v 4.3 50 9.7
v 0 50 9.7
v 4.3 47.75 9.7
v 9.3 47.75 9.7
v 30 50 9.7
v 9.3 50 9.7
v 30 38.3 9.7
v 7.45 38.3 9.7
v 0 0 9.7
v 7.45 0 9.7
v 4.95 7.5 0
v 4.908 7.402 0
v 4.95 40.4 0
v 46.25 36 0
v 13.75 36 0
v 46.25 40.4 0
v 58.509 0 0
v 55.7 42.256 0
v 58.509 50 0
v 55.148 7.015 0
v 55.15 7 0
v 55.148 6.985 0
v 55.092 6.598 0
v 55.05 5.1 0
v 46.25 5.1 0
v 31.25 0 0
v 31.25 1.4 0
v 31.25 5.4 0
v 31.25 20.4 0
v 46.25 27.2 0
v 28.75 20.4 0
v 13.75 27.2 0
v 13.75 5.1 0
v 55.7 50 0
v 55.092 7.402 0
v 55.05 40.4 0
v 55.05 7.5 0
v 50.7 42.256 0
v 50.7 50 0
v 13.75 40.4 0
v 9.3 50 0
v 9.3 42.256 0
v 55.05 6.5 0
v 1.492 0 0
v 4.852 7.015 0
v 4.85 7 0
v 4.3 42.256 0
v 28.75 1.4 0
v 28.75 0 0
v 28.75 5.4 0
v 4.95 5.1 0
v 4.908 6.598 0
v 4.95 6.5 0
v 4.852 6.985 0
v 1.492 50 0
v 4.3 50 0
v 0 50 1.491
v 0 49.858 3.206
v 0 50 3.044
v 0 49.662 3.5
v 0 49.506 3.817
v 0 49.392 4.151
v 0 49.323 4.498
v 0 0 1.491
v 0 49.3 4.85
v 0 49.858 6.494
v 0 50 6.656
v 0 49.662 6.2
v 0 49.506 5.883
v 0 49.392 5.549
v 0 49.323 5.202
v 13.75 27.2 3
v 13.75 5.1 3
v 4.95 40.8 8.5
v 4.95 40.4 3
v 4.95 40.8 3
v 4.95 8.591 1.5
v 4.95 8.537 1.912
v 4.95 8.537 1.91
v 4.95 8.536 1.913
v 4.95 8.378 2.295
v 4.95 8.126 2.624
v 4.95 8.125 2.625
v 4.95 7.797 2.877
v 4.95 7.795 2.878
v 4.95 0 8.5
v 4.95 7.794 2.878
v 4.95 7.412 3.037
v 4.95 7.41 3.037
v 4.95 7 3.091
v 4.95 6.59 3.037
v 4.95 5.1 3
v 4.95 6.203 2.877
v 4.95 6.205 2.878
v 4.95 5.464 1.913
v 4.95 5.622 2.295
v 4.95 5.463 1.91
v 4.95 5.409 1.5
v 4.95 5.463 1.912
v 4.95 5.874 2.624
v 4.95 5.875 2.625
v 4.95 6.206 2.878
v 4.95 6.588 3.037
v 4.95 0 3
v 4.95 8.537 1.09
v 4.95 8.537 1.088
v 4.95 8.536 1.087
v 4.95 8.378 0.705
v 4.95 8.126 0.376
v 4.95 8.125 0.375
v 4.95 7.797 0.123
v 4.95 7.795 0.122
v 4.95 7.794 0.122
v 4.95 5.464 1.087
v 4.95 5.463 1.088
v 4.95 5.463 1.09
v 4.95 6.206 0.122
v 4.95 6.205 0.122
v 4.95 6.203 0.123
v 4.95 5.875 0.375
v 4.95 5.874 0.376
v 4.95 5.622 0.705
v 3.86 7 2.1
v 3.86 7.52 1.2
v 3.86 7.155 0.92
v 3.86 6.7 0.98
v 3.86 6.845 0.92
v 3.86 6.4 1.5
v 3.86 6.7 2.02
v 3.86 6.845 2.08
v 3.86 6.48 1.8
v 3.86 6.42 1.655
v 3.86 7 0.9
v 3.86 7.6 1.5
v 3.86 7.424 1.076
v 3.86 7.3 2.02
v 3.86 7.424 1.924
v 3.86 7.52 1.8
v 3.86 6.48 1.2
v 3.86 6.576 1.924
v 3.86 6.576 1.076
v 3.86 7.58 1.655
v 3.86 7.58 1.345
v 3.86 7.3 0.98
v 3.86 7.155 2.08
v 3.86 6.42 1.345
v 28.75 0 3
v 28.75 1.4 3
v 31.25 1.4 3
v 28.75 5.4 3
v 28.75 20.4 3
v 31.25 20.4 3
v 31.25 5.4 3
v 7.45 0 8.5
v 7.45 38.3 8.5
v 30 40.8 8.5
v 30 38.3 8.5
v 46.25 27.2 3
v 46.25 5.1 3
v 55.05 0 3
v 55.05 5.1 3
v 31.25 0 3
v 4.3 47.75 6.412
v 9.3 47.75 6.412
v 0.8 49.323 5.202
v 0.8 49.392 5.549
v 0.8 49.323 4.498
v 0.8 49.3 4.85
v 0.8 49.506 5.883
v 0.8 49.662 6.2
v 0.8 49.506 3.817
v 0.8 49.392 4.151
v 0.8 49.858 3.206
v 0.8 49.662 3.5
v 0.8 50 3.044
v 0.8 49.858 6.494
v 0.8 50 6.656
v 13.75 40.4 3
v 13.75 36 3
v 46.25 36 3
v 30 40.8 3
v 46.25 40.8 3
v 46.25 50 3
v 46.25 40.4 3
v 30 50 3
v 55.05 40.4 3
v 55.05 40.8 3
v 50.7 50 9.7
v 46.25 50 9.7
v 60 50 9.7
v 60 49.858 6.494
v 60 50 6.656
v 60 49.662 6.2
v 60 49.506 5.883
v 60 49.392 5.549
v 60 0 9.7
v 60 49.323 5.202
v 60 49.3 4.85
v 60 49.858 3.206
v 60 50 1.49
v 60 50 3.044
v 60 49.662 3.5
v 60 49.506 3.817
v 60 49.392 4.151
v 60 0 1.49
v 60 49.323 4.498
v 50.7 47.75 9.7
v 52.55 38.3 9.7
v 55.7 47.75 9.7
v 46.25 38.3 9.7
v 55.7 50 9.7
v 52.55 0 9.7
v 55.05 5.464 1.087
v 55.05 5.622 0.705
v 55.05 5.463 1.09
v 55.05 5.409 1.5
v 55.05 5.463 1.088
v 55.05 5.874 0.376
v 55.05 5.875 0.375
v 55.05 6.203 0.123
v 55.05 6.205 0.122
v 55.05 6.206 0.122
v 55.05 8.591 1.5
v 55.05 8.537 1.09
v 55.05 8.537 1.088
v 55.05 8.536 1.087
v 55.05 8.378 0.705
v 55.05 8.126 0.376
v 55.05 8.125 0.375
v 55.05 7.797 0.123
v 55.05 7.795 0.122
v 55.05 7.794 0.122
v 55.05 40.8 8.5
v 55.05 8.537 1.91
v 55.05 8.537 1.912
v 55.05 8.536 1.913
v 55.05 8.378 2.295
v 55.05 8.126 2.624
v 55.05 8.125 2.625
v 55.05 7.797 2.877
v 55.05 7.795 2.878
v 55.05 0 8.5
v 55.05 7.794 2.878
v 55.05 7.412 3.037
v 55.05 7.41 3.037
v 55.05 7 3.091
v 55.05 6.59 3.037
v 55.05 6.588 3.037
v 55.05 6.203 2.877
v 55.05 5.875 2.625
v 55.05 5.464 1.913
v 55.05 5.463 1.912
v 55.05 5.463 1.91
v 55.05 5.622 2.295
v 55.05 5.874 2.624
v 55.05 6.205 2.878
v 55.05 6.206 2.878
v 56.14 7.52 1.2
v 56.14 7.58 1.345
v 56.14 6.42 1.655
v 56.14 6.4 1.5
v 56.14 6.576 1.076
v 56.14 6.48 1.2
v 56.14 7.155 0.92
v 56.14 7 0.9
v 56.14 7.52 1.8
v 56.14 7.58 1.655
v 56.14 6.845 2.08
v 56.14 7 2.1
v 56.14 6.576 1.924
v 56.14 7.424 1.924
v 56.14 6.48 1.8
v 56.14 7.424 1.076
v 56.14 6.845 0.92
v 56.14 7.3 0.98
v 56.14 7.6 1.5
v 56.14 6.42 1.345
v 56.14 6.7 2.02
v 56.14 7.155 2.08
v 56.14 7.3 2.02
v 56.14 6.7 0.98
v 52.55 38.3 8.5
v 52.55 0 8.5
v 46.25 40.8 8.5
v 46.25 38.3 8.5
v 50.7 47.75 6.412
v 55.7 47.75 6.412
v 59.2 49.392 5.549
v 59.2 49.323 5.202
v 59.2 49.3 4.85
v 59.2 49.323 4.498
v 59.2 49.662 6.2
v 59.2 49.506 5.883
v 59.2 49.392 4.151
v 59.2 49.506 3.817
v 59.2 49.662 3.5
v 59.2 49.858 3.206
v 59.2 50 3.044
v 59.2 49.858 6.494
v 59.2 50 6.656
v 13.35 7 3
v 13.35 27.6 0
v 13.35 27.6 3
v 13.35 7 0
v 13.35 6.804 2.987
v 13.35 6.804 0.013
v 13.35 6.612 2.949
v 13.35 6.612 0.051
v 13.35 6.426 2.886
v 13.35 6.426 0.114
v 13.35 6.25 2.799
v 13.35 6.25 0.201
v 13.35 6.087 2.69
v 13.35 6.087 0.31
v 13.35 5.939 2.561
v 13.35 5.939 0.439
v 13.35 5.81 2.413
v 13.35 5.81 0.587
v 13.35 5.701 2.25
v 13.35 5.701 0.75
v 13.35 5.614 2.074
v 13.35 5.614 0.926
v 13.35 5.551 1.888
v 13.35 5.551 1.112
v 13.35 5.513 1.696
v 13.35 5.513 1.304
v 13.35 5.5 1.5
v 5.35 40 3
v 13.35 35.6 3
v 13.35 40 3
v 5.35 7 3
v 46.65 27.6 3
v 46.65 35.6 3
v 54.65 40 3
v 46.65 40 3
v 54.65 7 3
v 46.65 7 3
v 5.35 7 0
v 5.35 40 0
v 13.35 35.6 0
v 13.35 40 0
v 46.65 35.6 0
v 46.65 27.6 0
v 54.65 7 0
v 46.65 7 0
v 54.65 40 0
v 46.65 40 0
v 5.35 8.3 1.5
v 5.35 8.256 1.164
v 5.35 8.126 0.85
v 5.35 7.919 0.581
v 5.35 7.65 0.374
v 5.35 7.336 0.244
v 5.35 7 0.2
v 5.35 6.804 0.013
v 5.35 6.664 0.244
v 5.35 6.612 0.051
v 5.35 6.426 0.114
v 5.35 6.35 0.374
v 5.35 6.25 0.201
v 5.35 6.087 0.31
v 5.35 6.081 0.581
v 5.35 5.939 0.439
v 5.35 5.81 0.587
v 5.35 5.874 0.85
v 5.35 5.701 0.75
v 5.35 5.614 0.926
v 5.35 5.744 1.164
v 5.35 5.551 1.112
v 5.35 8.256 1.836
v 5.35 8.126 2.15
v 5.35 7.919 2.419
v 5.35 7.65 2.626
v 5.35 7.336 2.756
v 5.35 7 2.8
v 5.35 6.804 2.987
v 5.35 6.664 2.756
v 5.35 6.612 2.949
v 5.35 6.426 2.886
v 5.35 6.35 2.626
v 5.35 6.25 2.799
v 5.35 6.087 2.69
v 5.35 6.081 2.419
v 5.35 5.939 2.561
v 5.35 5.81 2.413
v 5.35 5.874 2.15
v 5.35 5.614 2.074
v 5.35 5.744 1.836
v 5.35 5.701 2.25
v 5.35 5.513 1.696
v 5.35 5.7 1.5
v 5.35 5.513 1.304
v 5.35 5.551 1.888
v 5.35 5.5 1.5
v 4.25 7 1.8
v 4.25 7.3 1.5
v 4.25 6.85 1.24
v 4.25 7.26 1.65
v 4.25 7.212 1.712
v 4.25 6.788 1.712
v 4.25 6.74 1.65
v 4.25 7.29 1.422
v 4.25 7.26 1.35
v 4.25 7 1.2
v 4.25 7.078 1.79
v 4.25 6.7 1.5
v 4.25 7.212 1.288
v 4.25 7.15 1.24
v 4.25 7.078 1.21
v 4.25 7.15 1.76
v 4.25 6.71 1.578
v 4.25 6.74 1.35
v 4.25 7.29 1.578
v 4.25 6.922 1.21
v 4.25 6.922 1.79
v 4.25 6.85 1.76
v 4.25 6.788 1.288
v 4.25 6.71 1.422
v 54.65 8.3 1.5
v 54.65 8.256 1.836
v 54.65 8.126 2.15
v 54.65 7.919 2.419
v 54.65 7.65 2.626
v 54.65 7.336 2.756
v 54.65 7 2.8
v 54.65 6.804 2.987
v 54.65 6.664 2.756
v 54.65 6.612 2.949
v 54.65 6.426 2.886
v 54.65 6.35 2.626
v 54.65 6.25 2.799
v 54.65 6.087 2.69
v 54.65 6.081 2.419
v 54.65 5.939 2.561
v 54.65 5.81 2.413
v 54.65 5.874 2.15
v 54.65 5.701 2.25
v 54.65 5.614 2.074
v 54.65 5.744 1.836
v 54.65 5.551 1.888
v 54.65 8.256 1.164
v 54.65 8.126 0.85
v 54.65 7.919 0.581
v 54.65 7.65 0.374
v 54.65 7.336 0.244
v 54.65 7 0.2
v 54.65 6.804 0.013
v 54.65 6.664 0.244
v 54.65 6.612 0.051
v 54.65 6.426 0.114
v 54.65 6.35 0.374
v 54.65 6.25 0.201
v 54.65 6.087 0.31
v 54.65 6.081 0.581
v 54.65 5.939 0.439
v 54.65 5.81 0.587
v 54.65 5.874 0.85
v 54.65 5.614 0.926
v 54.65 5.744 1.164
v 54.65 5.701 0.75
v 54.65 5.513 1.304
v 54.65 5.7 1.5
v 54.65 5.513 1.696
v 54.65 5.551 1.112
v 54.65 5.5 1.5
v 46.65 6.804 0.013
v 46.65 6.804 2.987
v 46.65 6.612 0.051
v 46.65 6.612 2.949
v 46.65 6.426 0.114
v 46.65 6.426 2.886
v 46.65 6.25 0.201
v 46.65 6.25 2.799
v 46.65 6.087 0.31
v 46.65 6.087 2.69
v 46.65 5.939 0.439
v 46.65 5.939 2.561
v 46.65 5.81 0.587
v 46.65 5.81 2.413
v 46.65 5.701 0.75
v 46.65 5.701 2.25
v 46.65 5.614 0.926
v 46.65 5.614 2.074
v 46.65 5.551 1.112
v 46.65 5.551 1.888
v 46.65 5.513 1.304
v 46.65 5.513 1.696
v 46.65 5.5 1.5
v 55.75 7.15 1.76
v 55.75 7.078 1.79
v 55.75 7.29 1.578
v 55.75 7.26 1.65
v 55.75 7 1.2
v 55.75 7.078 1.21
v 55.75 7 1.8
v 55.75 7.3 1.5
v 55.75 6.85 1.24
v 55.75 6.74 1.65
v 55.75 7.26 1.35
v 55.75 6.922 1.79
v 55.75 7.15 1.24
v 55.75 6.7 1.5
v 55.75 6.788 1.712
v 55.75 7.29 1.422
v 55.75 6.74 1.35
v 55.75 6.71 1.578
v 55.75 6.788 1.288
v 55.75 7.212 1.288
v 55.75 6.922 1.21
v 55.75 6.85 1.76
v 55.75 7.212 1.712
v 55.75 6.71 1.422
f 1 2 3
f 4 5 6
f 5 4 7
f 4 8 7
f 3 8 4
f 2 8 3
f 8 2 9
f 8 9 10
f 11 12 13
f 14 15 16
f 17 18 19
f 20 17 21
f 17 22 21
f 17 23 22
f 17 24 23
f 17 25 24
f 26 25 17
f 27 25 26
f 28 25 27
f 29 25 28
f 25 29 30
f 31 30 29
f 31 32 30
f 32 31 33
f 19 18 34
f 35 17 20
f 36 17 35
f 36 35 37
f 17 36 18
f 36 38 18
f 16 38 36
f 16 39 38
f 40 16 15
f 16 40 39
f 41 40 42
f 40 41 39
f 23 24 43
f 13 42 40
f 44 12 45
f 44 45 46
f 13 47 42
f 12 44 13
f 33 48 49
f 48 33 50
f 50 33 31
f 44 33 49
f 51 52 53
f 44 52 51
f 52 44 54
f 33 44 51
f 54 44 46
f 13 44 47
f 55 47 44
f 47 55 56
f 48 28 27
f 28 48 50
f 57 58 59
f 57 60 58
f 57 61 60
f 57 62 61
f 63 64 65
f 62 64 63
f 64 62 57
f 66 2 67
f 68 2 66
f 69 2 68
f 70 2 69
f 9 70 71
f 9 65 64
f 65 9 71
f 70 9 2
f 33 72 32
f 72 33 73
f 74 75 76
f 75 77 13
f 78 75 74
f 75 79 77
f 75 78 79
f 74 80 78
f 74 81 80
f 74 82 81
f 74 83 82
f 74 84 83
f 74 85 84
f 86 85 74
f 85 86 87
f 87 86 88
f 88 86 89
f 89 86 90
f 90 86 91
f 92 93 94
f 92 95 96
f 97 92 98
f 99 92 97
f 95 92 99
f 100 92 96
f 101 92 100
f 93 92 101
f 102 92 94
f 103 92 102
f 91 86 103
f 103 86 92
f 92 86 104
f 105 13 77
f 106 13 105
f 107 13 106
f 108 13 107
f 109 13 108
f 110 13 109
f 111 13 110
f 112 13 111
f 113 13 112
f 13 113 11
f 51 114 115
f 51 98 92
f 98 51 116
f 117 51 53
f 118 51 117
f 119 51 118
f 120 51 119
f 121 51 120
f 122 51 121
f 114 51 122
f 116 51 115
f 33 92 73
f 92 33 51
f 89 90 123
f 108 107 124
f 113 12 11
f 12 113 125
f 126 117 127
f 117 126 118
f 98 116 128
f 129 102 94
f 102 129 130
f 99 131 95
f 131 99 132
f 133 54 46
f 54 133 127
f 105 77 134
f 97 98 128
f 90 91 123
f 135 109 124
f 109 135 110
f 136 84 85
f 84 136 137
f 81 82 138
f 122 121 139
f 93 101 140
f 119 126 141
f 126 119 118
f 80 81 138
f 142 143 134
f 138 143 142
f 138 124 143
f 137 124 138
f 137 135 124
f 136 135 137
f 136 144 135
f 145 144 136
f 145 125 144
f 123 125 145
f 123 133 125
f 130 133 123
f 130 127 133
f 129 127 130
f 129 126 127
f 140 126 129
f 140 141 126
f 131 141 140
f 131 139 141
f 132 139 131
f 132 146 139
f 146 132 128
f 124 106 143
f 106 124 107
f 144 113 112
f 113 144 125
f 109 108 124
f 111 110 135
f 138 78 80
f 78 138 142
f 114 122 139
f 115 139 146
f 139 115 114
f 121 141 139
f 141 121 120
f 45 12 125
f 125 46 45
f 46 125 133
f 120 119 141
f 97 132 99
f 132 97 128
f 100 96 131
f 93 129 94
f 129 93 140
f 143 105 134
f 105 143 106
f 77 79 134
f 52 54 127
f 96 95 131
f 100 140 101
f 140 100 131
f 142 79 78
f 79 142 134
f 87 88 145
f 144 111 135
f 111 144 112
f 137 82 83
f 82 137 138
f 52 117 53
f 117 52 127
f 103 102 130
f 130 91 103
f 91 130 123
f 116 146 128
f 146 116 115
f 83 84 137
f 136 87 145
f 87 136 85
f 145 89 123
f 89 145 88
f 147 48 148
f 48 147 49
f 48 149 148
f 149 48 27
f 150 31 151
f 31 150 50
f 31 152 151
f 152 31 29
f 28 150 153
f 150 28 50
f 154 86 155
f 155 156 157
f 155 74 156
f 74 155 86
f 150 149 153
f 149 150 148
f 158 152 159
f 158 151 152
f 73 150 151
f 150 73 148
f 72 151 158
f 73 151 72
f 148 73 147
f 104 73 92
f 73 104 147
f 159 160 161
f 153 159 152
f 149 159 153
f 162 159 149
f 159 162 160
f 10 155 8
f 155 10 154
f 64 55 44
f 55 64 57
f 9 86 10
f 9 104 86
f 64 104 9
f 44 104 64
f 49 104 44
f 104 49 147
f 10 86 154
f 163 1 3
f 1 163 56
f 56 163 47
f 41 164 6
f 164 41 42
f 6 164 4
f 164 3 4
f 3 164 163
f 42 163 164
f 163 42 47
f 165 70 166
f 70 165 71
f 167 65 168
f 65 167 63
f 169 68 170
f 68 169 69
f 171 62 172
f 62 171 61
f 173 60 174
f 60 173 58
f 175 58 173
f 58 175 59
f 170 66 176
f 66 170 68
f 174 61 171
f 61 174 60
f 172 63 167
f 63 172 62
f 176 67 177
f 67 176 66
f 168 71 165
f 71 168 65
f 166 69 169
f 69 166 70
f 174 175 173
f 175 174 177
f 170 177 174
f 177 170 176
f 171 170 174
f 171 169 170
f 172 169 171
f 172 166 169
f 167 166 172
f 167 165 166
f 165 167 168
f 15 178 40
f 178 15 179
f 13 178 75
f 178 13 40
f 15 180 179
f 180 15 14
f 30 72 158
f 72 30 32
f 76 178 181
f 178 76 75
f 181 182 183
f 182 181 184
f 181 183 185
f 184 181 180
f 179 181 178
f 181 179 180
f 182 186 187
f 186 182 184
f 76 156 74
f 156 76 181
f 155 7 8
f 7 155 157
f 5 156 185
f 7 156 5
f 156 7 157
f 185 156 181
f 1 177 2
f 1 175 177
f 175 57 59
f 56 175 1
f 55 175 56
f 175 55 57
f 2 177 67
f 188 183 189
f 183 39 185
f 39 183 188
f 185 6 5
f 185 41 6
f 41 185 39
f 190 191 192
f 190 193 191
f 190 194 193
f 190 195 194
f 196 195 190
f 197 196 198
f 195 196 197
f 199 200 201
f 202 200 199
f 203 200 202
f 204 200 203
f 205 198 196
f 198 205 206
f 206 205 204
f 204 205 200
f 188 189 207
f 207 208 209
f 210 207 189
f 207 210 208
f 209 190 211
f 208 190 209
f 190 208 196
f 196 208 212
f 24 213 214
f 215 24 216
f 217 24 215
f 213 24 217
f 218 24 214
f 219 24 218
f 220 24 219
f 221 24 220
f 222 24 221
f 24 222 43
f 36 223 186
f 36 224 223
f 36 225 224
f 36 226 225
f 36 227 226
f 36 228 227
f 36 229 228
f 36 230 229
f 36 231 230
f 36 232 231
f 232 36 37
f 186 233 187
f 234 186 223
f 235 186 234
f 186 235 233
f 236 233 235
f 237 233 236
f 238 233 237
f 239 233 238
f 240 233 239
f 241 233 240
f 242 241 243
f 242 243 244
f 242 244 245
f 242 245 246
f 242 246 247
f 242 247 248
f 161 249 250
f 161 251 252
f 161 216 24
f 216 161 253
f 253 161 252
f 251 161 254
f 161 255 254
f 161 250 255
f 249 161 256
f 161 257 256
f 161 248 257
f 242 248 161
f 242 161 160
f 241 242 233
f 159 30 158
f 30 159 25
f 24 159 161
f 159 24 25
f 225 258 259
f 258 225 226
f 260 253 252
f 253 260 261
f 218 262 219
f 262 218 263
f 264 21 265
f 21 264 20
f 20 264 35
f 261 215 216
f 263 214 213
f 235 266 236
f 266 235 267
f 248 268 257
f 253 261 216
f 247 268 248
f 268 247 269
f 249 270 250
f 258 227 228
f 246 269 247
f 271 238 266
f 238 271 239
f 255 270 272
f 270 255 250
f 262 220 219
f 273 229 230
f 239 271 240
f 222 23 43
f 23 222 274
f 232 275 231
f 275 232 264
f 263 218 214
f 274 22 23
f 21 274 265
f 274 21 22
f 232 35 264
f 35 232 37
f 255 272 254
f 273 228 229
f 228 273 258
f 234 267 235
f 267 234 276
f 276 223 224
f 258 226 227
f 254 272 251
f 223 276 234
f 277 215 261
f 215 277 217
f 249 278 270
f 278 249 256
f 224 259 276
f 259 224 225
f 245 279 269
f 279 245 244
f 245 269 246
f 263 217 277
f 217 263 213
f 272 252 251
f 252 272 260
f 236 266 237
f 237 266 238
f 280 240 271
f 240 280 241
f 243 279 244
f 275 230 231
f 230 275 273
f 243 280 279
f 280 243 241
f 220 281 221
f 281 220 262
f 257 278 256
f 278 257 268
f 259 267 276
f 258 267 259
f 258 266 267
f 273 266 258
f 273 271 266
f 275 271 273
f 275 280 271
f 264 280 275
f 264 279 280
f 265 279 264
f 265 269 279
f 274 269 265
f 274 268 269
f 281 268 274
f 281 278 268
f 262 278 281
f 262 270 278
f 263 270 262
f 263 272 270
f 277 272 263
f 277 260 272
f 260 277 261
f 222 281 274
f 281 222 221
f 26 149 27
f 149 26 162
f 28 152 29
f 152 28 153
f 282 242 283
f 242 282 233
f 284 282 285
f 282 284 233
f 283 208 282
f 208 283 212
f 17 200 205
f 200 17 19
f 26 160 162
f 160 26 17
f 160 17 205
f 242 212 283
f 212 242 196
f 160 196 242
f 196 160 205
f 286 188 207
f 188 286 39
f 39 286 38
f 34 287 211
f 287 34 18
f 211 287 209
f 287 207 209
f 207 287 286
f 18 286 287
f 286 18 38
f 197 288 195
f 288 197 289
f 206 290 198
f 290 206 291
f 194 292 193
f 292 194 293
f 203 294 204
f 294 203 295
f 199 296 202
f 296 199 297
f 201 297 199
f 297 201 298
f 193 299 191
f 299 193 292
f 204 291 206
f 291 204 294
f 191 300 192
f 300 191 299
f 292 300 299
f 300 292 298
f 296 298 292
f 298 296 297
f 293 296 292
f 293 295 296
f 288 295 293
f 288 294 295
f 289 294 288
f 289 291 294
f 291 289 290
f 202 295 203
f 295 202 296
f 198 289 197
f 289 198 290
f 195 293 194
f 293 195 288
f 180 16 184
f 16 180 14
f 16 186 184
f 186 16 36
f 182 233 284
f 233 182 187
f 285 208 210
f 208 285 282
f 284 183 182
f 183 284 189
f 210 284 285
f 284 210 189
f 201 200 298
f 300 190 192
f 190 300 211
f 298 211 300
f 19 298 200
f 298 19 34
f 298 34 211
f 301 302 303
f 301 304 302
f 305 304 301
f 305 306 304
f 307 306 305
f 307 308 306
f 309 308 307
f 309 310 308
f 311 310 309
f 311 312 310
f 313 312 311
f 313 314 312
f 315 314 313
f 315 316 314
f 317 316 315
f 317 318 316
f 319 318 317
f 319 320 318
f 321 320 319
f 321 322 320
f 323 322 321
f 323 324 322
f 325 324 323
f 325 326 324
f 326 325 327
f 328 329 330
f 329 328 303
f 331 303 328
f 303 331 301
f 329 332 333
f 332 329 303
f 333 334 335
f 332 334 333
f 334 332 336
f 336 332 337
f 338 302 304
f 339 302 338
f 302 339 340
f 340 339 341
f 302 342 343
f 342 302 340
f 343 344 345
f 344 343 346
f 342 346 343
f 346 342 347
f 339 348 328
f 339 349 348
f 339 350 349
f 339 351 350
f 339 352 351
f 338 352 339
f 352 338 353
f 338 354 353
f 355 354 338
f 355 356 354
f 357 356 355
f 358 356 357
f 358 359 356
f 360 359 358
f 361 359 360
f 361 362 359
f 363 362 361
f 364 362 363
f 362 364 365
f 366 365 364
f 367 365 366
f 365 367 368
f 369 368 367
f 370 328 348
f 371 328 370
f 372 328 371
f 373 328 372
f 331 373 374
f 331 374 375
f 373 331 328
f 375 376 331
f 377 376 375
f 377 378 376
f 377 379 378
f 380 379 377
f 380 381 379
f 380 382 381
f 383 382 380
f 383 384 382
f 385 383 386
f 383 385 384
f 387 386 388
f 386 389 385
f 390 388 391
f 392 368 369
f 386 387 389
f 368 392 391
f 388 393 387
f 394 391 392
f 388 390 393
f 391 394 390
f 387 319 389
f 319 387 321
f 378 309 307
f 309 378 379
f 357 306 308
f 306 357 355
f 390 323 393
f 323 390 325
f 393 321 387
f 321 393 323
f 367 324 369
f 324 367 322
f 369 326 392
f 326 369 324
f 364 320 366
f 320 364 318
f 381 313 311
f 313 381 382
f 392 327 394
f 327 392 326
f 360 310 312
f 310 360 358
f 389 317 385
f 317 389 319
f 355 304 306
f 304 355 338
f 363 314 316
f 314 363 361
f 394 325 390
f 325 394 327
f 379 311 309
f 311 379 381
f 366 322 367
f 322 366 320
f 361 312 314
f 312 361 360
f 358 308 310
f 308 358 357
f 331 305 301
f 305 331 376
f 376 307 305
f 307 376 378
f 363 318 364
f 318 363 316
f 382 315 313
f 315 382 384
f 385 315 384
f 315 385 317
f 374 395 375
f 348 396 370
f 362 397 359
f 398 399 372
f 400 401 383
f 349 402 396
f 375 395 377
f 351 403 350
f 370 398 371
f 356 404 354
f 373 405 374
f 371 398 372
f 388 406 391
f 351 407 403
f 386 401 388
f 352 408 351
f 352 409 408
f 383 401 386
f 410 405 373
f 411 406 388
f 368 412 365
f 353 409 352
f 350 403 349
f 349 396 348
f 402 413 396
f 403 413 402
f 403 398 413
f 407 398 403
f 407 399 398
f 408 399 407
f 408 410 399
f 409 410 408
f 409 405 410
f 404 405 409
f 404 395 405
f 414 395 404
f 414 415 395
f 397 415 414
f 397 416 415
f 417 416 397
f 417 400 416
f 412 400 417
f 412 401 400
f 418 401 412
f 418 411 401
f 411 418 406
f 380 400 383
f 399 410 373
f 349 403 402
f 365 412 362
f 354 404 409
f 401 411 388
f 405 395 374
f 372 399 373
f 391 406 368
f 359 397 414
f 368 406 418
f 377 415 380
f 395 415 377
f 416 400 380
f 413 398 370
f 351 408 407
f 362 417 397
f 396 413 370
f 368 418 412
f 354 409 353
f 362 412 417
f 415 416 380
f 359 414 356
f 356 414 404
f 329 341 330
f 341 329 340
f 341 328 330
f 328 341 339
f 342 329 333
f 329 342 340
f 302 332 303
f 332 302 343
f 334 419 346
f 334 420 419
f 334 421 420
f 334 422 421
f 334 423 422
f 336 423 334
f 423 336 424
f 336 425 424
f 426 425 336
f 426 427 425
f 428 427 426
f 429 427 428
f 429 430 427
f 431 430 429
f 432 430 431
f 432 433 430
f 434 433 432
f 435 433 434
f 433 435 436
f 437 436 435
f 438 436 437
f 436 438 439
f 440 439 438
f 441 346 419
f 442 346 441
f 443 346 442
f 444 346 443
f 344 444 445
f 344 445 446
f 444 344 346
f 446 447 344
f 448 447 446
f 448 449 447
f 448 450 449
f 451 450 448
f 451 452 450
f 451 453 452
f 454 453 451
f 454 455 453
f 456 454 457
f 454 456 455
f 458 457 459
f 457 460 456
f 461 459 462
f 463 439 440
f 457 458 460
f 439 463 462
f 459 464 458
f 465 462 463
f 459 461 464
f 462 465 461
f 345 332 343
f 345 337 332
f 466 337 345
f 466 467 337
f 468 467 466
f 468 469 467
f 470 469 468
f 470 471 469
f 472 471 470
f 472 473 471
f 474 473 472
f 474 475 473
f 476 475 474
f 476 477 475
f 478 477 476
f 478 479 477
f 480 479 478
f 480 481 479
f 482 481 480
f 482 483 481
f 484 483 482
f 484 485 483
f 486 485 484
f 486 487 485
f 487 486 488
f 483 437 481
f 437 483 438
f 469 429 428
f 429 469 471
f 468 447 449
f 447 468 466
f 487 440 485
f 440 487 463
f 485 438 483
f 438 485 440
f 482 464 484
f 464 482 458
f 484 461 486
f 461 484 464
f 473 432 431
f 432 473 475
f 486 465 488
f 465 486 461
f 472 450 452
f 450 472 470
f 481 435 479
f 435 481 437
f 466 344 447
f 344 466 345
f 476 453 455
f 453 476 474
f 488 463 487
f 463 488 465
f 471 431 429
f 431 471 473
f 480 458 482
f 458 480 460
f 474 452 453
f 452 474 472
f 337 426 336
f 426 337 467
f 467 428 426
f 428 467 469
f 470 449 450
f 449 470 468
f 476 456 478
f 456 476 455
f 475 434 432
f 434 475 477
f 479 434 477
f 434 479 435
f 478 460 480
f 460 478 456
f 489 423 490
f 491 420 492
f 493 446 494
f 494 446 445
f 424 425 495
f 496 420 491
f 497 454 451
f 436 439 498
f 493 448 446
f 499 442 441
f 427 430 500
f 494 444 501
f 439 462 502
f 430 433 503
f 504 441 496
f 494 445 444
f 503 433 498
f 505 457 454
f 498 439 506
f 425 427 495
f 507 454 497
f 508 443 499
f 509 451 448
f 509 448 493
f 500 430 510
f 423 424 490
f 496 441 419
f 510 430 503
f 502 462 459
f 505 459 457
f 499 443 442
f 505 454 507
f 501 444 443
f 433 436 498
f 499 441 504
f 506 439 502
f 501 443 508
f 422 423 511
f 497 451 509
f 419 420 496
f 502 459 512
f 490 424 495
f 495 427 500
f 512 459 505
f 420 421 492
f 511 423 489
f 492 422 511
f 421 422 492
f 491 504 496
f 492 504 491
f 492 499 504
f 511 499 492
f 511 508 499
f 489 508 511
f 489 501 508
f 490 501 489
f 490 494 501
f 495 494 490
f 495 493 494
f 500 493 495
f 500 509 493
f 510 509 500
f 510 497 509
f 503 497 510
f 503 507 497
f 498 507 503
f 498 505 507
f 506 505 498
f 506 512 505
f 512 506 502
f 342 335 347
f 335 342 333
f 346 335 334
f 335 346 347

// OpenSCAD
// Prop test piece for cyberdeck1 rev 0.2: the cone pivots and the click of the prop.
//
// The four corners of the prop and of its opening, cut from the real tablet half and moved
// together: both pivots with their ears, both feet with their click bumps, springs and
// dimples. The middle of the panel is left out, so the piece is 60 x 51 mm and its prop
// is 39 mm long, not 105 mm. The shapes come from ../case02/case02.scad, so a change
// there changes this piece. It prints as one job; the prop prints in place.
//
// Make the plate:  openscad-nightly -o prop_test_plate.stl prop_test.scad

include <../case02/case02.scad>
view = "none";       // draw nothing from case02.scad itself

tpart = "plate";     // plate | frame | prop
XK = 30;             // width kept at each side
Y_PIV = [-SP - 7, -SP + 15];          // length kept at the pivot
Y_TIP = [-TIP_S - 18, -TIP_S + 10];   // length kept at the feet
DX = W - 2 * XK;  DY = Y_PIV[1] - Y_TIP[0];

// Keep the four corners of the child and move them together.
module corners() {
    for (i = [0, 1], j = [0, 1]) {
        yr = j == 0 ? Y_PIV : Y_TIP;
        translate([i * -DX, j * DY, 0]) intersection() {
            children();
            translate([i == 0 ? -1 : W - XK, yr[0], -50]) cube([XK + 1, yr[1] - yr[0], 100]);
        }
    }
}

module prop_plate(part = "plate") {
    translate([0, -Y_PIV[0], T_T]) {
        if (part != "prop") corners() t_half();
        if (part != "frame") corners() prop();
    }
}

prop_plate(tpart);
